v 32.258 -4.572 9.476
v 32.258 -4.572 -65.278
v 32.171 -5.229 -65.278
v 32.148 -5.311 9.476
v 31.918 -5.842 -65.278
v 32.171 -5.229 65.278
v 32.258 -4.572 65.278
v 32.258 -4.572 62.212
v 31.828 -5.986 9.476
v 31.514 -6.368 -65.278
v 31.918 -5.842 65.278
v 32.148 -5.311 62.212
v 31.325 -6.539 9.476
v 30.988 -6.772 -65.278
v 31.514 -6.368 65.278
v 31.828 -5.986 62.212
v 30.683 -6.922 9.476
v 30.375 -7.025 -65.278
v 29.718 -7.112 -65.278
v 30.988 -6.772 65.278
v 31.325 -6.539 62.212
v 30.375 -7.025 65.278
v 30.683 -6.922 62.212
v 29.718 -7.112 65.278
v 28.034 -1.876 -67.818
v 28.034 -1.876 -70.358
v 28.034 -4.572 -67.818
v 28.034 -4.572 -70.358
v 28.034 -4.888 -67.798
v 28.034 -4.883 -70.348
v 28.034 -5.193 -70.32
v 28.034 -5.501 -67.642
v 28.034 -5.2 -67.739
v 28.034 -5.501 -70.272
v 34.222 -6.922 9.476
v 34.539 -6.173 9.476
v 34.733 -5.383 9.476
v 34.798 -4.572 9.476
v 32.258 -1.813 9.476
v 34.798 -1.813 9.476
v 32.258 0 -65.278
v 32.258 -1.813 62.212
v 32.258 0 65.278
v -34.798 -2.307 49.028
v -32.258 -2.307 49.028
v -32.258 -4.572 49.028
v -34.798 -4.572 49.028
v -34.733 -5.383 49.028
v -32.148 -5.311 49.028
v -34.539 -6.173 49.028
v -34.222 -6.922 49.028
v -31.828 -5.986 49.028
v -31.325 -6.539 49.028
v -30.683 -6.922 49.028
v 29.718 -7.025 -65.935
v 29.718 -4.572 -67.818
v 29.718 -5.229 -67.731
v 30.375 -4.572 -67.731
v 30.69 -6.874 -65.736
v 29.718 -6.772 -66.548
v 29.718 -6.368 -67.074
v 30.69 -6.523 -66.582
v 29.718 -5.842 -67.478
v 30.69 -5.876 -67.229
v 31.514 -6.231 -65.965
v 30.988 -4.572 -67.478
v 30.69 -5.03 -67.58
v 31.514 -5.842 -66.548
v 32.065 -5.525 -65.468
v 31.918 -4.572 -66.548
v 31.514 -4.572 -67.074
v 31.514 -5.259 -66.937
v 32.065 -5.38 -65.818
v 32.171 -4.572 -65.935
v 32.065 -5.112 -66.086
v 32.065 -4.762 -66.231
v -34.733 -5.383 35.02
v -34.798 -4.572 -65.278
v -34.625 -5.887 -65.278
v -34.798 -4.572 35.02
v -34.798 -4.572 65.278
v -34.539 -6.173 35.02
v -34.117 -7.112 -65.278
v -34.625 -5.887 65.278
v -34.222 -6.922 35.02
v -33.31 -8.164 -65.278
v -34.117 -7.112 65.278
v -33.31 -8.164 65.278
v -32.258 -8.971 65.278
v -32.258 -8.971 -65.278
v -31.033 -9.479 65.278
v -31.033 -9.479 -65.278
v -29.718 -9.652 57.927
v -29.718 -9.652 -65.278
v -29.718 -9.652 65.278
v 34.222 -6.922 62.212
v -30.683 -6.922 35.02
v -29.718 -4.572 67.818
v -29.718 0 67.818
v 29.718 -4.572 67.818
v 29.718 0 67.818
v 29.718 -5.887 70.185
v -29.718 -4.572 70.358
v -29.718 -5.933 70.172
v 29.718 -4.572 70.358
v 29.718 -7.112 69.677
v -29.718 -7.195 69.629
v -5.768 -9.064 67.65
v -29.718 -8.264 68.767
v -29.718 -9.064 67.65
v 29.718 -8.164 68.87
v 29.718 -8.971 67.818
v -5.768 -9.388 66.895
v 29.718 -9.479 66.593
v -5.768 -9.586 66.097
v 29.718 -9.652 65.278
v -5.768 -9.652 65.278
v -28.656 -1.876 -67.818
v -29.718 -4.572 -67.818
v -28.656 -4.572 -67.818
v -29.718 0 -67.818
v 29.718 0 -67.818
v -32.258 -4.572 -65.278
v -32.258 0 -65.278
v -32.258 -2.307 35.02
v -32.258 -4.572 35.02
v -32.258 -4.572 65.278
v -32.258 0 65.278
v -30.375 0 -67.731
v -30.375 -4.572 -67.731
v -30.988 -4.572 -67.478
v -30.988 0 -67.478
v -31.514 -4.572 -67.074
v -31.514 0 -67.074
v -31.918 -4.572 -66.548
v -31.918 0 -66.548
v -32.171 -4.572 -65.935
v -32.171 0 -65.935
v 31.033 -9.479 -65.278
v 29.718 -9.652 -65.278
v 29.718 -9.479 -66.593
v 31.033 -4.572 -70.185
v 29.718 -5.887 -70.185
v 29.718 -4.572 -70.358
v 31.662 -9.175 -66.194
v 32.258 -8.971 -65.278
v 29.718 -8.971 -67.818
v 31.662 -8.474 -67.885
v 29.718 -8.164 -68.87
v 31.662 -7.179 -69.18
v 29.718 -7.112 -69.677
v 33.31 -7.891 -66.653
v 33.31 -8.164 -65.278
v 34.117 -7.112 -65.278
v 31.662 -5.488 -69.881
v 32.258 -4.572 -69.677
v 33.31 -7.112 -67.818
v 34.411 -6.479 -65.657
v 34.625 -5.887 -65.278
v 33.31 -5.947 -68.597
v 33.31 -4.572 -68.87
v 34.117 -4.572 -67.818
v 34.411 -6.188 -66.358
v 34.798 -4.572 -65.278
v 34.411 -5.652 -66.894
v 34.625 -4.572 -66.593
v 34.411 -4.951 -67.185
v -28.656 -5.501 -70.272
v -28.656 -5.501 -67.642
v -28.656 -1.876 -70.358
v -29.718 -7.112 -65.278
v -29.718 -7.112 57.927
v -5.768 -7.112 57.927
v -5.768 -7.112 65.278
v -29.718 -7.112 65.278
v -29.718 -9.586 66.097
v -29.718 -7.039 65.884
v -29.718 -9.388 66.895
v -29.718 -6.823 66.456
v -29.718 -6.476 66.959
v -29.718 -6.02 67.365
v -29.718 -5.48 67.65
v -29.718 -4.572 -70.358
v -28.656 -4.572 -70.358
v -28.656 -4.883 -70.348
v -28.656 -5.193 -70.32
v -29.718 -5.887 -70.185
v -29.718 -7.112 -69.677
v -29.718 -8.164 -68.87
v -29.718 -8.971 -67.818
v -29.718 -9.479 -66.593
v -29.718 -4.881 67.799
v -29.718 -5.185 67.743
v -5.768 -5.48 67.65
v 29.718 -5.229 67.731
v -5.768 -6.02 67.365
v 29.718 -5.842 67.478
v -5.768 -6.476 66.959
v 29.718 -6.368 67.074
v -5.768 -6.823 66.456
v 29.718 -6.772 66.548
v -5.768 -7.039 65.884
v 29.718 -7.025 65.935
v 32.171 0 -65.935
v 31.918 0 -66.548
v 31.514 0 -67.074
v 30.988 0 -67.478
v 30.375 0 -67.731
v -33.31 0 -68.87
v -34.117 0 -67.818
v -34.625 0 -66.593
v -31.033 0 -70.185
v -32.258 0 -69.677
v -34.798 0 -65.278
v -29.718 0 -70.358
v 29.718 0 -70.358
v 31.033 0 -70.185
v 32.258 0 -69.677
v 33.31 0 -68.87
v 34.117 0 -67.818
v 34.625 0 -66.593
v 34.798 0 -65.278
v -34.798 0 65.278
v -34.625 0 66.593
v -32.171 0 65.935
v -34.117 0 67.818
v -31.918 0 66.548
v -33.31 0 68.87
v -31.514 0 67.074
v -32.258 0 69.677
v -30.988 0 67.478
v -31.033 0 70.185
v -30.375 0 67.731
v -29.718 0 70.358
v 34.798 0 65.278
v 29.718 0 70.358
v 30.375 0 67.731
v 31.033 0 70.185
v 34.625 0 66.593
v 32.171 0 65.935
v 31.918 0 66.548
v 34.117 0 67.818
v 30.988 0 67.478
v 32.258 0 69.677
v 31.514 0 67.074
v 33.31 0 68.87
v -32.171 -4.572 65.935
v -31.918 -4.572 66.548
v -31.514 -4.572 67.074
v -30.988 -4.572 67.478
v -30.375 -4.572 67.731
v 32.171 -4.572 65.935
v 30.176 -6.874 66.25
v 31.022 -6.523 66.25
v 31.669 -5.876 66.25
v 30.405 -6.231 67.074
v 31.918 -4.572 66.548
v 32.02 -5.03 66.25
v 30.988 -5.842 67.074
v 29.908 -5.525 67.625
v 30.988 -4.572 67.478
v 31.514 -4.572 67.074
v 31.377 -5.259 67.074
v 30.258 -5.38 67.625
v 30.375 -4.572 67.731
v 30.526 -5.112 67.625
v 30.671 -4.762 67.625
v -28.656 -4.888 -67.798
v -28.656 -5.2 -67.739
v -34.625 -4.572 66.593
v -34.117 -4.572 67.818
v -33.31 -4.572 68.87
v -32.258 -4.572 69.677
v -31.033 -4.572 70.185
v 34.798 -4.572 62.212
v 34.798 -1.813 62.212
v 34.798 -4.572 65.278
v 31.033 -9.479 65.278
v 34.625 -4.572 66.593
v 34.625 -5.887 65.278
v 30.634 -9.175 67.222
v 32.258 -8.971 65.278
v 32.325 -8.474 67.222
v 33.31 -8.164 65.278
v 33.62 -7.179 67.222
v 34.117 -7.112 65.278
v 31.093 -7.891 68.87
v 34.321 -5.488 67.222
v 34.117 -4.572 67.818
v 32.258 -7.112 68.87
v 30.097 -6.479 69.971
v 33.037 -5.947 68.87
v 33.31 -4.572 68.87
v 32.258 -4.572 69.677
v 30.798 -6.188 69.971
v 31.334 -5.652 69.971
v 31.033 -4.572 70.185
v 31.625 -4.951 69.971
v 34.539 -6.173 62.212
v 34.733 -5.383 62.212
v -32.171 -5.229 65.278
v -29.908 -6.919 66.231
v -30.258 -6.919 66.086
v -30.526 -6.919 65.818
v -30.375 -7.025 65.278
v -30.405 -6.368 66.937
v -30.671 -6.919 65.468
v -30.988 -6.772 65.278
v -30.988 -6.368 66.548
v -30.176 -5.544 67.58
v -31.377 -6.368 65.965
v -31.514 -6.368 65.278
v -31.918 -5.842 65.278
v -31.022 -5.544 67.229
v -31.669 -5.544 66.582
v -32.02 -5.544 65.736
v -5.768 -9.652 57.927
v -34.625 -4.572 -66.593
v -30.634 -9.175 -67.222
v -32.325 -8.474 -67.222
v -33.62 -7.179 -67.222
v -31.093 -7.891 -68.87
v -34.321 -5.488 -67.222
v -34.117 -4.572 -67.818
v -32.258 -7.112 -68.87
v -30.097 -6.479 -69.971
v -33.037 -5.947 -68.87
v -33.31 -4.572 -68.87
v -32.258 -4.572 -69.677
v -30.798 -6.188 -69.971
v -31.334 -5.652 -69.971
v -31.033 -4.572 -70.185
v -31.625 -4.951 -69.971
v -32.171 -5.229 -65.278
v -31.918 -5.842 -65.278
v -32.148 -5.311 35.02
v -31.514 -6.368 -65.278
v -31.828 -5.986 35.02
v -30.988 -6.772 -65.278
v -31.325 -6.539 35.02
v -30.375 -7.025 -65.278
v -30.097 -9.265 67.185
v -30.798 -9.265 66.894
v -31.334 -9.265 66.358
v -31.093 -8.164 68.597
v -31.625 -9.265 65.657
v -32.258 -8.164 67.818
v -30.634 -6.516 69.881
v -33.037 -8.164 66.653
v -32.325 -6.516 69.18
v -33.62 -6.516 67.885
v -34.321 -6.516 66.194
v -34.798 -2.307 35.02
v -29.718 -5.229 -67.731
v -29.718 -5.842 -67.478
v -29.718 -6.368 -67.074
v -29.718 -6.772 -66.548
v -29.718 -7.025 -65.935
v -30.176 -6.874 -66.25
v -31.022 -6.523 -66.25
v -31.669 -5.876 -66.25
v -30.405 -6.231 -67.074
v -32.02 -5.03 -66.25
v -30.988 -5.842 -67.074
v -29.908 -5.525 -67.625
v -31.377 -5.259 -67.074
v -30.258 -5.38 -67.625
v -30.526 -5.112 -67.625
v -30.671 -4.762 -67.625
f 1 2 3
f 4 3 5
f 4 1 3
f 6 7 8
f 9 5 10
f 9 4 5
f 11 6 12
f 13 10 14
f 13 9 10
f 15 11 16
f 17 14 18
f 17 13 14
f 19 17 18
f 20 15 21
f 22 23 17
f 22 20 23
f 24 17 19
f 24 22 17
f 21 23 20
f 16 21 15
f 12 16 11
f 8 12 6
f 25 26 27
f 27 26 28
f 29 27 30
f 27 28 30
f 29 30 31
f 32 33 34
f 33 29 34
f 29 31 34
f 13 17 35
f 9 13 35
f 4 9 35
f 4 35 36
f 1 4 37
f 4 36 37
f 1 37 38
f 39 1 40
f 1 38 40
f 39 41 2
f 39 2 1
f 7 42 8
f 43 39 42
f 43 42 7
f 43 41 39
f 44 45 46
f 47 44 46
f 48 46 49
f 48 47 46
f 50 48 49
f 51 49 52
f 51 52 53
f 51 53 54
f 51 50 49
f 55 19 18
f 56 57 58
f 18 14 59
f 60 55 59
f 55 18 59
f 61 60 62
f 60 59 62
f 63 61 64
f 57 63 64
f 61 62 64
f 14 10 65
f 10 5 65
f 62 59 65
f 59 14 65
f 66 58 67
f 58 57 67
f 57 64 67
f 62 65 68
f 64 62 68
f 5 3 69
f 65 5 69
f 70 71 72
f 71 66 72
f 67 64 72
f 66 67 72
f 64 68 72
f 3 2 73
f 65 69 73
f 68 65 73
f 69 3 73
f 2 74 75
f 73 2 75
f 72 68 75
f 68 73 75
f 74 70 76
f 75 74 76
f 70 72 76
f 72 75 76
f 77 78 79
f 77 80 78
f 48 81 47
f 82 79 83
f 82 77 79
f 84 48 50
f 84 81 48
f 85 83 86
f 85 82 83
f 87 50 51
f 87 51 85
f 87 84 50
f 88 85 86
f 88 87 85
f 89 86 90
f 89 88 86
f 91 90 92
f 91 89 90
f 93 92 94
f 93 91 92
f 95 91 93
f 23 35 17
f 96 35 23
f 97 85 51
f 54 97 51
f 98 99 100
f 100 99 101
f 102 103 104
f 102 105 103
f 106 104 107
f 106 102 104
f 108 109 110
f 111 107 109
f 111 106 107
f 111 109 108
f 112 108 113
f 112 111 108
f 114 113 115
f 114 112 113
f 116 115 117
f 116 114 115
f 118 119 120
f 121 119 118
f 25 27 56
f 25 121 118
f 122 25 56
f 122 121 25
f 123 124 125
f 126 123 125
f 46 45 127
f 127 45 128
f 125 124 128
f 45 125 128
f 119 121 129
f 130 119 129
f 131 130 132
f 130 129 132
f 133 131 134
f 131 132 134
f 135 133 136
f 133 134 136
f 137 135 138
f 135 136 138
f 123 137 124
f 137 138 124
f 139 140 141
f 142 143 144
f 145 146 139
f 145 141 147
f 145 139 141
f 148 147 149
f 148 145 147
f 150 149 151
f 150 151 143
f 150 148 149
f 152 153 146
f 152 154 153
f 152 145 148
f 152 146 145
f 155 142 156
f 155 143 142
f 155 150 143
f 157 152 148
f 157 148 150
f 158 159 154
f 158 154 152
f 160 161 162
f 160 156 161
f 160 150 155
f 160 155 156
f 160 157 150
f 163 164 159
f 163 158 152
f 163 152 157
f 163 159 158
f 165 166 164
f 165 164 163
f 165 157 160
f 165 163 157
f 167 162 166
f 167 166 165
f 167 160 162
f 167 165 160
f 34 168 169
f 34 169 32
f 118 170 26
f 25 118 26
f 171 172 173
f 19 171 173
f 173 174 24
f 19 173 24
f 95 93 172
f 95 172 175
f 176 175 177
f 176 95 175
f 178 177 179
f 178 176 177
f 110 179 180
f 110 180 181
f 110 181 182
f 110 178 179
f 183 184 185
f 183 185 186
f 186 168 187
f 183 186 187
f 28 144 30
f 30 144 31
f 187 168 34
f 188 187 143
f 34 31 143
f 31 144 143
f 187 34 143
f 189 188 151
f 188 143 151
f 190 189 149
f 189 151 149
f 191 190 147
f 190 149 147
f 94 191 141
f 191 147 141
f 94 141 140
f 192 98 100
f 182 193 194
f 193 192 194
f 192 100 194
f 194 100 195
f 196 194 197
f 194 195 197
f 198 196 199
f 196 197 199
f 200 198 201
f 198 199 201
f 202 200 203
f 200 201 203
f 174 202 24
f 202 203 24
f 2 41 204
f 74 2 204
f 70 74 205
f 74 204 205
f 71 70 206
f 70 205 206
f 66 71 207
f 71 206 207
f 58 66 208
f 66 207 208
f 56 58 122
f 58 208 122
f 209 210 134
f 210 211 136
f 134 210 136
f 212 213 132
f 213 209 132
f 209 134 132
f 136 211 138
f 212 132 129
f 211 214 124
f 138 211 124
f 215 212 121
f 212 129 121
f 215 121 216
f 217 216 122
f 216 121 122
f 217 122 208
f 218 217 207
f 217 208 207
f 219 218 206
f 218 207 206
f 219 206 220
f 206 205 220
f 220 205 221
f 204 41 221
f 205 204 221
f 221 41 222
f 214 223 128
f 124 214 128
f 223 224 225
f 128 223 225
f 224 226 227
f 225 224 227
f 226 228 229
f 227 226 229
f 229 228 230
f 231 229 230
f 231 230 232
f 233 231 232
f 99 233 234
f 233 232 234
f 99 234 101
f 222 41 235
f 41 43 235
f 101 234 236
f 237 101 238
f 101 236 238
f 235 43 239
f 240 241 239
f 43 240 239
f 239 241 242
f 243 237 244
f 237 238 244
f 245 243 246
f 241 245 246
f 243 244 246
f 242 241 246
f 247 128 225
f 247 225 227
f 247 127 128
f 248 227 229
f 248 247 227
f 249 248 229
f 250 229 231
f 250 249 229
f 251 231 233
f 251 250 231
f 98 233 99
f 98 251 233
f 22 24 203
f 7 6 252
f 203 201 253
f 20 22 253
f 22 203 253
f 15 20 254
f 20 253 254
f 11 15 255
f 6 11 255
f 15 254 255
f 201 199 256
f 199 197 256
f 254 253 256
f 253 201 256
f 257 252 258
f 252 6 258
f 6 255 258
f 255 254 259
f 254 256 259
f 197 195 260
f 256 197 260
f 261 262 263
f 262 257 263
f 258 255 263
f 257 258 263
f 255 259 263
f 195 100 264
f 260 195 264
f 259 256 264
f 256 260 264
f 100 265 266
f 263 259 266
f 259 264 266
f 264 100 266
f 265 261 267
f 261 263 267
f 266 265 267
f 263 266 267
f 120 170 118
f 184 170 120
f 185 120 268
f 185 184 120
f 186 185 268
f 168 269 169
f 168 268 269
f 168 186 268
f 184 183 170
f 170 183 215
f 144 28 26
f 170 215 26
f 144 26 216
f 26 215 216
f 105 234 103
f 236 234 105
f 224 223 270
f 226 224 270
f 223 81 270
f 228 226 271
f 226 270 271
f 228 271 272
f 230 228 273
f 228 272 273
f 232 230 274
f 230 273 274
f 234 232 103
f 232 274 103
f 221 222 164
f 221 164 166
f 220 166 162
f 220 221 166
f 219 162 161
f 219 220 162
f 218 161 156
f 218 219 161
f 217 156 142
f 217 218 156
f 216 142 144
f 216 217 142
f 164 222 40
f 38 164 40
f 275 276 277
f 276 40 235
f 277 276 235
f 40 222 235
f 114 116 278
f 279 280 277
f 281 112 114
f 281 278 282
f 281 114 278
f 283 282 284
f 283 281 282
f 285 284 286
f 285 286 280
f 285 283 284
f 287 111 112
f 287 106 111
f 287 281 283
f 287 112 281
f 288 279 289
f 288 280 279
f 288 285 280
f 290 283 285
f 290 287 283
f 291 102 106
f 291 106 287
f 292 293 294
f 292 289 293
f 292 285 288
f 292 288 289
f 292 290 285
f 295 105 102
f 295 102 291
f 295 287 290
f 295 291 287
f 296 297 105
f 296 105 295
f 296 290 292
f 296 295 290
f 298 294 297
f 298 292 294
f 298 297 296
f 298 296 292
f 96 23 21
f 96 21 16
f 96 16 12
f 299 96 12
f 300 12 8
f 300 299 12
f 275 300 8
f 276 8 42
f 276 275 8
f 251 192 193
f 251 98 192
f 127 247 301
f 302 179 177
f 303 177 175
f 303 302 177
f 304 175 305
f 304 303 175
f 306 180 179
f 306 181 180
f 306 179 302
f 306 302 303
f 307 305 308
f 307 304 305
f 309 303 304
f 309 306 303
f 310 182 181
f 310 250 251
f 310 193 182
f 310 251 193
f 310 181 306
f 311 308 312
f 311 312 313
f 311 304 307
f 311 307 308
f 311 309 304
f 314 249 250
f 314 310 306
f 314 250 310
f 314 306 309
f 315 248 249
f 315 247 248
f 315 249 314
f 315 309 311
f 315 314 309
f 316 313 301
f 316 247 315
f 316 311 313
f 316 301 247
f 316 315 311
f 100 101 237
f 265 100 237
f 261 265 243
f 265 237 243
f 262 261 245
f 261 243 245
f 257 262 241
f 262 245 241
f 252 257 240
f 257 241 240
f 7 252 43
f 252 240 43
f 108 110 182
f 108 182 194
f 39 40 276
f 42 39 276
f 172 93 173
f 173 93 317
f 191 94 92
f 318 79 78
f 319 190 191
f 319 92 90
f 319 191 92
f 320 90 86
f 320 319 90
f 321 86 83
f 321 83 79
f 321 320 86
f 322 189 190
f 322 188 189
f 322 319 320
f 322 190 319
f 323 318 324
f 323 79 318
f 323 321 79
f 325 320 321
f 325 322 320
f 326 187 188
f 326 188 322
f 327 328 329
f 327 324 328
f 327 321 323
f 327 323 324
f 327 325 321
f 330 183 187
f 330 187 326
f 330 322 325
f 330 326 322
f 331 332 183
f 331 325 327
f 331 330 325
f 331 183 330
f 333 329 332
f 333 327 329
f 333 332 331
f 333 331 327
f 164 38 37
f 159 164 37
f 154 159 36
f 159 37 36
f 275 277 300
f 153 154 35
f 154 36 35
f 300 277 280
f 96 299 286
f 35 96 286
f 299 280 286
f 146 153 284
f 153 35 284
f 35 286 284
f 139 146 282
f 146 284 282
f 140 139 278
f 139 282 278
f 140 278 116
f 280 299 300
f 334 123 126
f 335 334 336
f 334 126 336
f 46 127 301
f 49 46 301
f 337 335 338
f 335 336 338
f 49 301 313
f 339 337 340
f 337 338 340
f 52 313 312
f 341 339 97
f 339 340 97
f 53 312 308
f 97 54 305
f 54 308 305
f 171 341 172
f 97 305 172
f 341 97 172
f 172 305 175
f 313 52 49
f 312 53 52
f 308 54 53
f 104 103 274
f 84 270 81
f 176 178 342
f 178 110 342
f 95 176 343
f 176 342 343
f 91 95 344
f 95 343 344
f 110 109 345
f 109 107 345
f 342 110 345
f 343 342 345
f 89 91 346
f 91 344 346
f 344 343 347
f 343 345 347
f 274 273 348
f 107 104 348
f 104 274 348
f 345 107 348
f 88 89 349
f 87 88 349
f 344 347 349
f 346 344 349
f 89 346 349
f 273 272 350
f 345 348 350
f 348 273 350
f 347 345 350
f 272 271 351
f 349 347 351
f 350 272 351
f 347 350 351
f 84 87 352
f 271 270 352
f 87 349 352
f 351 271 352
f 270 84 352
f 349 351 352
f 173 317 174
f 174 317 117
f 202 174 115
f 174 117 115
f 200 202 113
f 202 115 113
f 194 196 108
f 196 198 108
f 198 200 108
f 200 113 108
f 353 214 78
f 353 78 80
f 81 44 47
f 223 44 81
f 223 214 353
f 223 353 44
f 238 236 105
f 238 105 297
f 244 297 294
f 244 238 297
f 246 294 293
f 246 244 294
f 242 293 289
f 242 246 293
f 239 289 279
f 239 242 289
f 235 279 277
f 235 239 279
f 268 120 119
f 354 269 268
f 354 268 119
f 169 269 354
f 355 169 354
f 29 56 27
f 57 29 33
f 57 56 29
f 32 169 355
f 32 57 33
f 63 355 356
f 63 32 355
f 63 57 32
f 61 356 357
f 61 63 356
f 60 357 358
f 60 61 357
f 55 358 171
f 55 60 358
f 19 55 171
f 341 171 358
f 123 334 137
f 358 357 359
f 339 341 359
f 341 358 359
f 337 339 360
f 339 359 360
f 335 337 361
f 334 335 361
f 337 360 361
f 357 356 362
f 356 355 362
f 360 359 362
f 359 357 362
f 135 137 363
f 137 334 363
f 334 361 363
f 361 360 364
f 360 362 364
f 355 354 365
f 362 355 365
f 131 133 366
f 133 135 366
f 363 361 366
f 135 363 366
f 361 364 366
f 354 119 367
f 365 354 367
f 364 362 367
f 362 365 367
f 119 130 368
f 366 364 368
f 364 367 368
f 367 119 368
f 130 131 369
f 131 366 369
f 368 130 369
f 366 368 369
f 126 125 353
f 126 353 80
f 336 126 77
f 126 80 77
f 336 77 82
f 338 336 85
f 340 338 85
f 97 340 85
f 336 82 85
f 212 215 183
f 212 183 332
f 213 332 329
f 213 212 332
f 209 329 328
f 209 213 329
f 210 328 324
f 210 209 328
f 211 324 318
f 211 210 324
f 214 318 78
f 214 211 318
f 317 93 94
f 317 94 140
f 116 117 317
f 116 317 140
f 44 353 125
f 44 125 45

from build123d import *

# Parameters (mm, degrees)
F0_W        = 69.596
F0_H        = 140.716
F1_DEPTH    = 9.652
F2_R        = 5.08
F3_T1_DEPTH = 17.272
F3_S5_W     = 5.08
F3_S5_H     = 5.08
F3_T6_DEPTH = 5.08
F4_T1_DEPTH = 17.272
F4_S5_W     = 5.08
F4_S5_H     = 5.08
F4_T6_DEPTH = 5.08
F5_T1_DEPTH = 17.272
F5_S5_W     = 5.08
F5_S5_H     = 5.08
F5_T6_DEPTH = 5.08
F6_T        = -2.54
F7_W        = 23.9500291884
F7_H        = 9.7231566906
F8_DEPTH    = 25.4
F9_W        = 5.1087748725
F9_H        = 52.7357356623
F10_DEPTH   = 25.4
F11_W       = 4.6143759973
F11_H       = 14.0079259872
F12_DEPTH   = 25.4
F14_W       = 56.6909182817
F14_H       = 3.6255817395
F15_DEPTH   = 25.4


# Not quite as in the source:
# - a fillet or chamfer that OpenCascade refuses, or shapes differently, is made with other operations: its cross-section is extruded or revolved along the edge and cut away or added


with BuildPart() as f1:
    # F0 (on Front) → F1 (new body)
    with BuildSketch(Plane.XZ):
        Rectangle(F0_W, F0_H)
    extrude(amount=F1_DEPTH)

    # F2
    f2_edges = [f1.edges().sort_by_distance(p)[0] for p in [
        (-34.798, -4.826, 70.358),
        (0, -9.652, 70.358),
        (-34.798, -9.652, 0),
        (0, -9.652, -70.358),
        (34.798, -9.652, 0),
    ]]
    fillet(f2_edges, radius=F2_R)

    # F3: fillet of radius 5.08 on 1 edges, made by hand

    # F3_s2 → F3_t1 (cut)
    with BuildSketch(Plane.XZ.offset(-12.7)):
        with BuildLine():
            ThreePointArc((29.718, 70.358), (33.3101024484, 68.8701024484), (34.798, 65.278))
            Line((34.798, 65.278), (34.798, 70.358))
            Line((34.798, 70.358), (29.718, 70.358))
        make_face()
    extrude(amount=F3_T1_DEPTH, mode=Mode.SUBTRACT)


with BuildPart() as f3_tool4:
    # F3_s5 → F3_t6 (new body)
    with BuildSketch(Plane.XY.offset(65.278)):
        with Locations((32.258, -7.112)):
            Rectangle(F3_S5_W, F3_S5_H)
    extrude(amount=F3_T6_DEPTH)

    # F3_s7 → F3_t8 (revolve, cut)
    with BuildSketch(Plane(origin=(29.718, -4.572, 65.278), x_dir=(-0.7071067812, 0.7071067812, 0), z_dir=(0.7071067812, 0.7071067812, 0))):
        with BuildLine():
            ThreePointArc((0, -5.08), (5.08, 0), (0, 5.08))
            Line((0, 5.08), (0, -5.08))
        make_face()
    revolve(axis=Axis((29.718, -4.572, 65.278), (0, 0, 1)), mode=Mode.SUBTRACT)


with BuildPart() as f1_1:
    add(f1.part)

    # F3_t3: cut F3_tool4
    add(f3_tool4.part, mode=Mode.SUBTRACT)

    # F4: fillet of radius 5.08 on 1 edges, made by hand

    # F4_s2 → F4_t1 (cut)
    with BuildSketch(Plane.XZ.offset(-12.7)):
        with BuildLine():
            ThreePointArc((-29.718, -70.358), (-33.3101024484, -68.8701024484), (-34.798, -65.278))
            Line((-34.798, -65.278), (-34.798, -70.358))
            Line((-34.798, -70.358), (-29.718, -70.358))
        make_face()
    extrude(amount=F4_T1_DEPTH, mode=Mode.SUBTRACT)


with BuildPart() as f4_tool4:
    # F4_s5 → F4_t6 (new body)
    with BuildSketch(Plane.XY.offset(-65.278)):
        with Locations((-32.258, -7.112)):
            Rectangle(F4_S5_W, F4_S5_H)
    extrude(amount=-F4_T6_DEPTH)

    # F4_s7 → F4_t8 (revolve, cut)
    with BuildSketch(Plane(origin=(-29.718, -4.572, -65.278), x_dir=(0.7071067812, 0.7071067812, 0), z_dir=(-0.7071067812, 0.7071067812, 0))):
        with BuildLine():
            ThreePointArc((0, -5.08), (5.08, 0), (0, 5.08))
            Line((0, 5.08), (0, -5.08))
        make_face()
    revolve(axis=Axis((-29.718, -4.572, -65.278), (0, 0, -1)), mode=Mode.SUBTRACT)


with BuildPart() as f1_2:
    add(f1_1.part)

    # F4_t3: cut F4_tool4
    add(f4_tool4.part, mode=Mode.SUBTRACT)

    # F5: fillet of radius 5.08 on 1 edges, made by hand

    # F5_s2 → F5_t1 (cut)
    with BuildSketch(Plane.XZ.offset(-12.7)):
        with BuildLine():
            ThreePointArc((34.798, -65.278), (33.3101024484, -68.8701024484), (29.718, -70.358))
            Line((29.718, -70.358), (34.798, -70.358))
            Line((34.798, -70.358), (34.798, -65.278))
        make_face()
    extrude(amount=F5_T1_DEPTH, mode=Mode.SUBTRACT)


with BuildPart() as f5_tool4:
    # F5_s5 → F5_t6 (new body)
    with BuildSketch(Plane.YZ.offset(29.718)):
        with Locations((-7.112, -67.818)):
            Rectangle(F5_S5_W, F5_S5_H)
    extrude(amount=F5_T6_DEPTH)

    # F5_s7 → F5_t8 (revolve, cut)
    with BuildSketch(Plane(origin=(29.718, -4.572, -65.278), x_dir=(0, 0.7071067812, 0.7071067812), z_dir=(0, 0.7071067812, -0.7071067812))):
        with BuildLine():
            ThreePointArc((0, -5.08), (5.08, 0), (0, 5.08))
            Line((0, 5.08), (0, -5.08))
        make_face()
    revolve(axis=Axis((29.718, -4.572, -65.278), (1, 0, 0)), mode=Mode.SUBTRACT)


with BuildPart() as f1_3:
    add(f1_2.part)

    # F5_t3: cut F5_tool4
    add(f5_tool4.part, mode=Mode.SUBTRACT)

    # F6
    f6_openings = [f1_3.faces().sort_by_distance(p)[0] for p in [
        (0, 0, 0),
    ]]
    offset(amount=F6_T, openings=f6_openings)

    # F7 (on face) → F8 (cut)
    with BuildSketch(Plane.XZ.offset(9.652)):
        with Locations((-17.7429854058, 62.7884864807)):
            Rectangle(F7_W, F7_H)
    extrude(amount=-F8_DEPTH, mode=Mode.SUBTRACT)

    # F9 (on face) → F10 (cut)
    with BuildSketch(Plane.YZ.offset(34.798)):
        with Locations((-4.3671781896, 35.8438207768)):
            Rectangle(F9_W, F9_H)
    extrude(amount=-F10_DEPTH, mode=Mode.SUBTRACT)

    # F11 (on face) → F12 (cut)
    with BuildSketch(Plane(origin=(-34.798, 0, 0), x_dir=(0, -1, 0), z_dir=(-1, 0, 0))):
        with Locations((4.6143762302, 42.0237891376)):
            Rectangle(F11_W, F11_H)
    extrude(amount=-F12_DEPTH, mode=Mode.SUBTRACT)

    # F14 (on face) → F15 (cut)
    with BuildSketch(Plane(origin=(0, 0, -70.358), x_dir=(1, 0, 0), z_dir=(0, 0, -1))):
        with Locations((-0.3109676763, 3.6884165602)):
            Rectangle(F14_W, F14_H)
    extrude(amount=-F15_DEPTH, mode=Mode.SUBTRACT)


solid = f1_3.part
